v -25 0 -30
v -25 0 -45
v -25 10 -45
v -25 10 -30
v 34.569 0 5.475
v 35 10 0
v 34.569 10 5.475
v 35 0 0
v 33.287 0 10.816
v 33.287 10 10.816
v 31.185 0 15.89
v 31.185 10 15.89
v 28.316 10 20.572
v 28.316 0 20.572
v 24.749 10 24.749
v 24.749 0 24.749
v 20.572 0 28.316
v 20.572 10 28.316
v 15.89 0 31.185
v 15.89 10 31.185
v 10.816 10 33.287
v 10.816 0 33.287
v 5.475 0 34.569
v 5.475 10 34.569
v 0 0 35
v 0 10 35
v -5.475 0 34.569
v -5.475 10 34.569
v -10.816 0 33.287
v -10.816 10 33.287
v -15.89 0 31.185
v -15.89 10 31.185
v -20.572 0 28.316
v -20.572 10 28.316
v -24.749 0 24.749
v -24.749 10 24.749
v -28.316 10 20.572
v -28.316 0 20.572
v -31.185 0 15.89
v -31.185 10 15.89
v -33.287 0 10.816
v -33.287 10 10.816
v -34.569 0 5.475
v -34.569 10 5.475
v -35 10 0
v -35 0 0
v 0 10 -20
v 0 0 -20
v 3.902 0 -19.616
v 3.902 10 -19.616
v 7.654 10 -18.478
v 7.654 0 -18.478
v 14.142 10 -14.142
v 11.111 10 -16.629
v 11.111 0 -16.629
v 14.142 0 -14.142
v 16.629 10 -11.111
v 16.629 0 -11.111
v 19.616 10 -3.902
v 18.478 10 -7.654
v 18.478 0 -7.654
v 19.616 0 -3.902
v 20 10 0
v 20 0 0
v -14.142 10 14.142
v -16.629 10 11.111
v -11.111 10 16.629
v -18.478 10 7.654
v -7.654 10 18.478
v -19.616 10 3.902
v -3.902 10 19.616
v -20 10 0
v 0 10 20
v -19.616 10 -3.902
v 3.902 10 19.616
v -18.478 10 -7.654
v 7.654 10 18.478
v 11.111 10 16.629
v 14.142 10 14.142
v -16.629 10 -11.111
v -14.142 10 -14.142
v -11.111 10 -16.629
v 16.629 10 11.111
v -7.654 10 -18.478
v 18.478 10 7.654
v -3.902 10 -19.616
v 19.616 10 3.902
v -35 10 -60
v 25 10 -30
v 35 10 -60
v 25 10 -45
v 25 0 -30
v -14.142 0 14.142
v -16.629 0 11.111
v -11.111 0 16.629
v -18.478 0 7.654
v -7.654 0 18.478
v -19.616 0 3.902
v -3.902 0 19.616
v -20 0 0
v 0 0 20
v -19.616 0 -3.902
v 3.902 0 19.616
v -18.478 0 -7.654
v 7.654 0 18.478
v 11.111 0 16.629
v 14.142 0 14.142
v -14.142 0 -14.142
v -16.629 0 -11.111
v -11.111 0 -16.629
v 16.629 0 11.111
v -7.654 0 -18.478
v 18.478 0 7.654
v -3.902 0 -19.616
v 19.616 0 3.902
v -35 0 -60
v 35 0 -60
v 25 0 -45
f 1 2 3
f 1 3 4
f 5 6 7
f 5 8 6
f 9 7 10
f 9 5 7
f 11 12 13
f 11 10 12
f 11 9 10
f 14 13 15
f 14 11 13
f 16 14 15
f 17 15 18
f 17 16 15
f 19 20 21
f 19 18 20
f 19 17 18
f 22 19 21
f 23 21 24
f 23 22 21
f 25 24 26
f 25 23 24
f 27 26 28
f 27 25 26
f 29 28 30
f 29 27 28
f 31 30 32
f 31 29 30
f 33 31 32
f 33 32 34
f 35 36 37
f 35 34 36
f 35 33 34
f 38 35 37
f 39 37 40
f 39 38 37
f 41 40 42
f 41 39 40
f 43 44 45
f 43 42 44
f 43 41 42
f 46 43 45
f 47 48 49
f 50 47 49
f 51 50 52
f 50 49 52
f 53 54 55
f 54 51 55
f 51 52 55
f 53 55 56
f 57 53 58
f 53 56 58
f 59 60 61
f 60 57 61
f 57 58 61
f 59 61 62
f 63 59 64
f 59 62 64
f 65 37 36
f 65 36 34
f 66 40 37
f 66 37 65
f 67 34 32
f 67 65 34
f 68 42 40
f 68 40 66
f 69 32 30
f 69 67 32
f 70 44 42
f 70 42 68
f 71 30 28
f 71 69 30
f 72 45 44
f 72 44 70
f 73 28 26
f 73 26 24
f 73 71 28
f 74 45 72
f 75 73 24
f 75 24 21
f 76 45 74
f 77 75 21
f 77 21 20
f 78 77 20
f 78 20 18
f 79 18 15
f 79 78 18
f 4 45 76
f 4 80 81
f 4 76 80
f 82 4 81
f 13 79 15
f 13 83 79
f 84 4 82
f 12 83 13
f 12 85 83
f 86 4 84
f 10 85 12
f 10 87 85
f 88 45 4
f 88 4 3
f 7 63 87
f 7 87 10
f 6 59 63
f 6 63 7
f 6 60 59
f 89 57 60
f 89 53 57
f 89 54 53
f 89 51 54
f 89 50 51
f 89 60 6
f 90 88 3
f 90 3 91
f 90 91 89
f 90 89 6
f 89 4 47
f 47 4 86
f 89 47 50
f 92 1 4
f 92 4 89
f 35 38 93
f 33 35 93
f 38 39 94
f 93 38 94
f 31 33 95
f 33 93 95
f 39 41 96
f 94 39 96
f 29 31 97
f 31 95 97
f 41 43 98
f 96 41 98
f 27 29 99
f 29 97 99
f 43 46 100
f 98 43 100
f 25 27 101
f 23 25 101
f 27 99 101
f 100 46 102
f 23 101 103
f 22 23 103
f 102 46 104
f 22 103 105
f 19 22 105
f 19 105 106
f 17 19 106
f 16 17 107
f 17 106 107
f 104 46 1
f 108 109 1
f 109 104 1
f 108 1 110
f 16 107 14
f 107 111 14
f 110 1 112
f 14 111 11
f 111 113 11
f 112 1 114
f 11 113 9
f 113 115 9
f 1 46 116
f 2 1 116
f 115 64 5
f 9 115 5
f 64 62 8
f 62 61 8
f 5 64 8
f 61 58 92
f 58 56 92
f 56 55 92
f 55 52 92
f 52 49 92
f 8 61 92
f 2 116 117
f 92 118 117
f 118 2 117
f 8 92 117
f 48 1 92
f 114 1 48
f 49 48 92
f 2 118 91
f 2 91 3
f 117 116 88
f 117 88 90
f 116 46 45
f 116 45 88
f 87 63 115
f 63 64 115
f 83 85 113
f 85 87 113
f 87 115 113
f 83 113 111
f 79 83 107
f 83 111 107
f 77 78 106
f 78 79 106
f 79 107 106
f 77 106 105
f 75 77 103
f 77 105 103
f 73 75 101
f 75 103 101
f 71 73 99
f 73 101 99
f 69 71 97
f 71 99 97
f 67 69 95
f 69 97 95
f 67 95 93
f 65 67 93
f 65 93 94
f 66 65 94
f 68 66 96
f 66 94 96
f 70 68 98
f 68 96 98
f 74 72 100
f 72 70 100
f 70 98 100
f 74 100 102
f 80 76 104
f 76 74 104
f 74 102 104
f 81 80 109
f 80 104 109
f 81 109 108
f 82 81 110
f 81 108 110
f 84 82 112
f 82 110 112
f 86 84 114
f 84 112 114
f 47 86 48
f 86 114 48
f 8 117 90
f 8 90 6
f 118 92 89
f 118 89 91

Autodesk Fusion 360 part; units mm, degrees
sketch "Sketch1" plane through (0, 0, 0) normal (0, 1, 0) x (1, 0, 0) in component "Component'"
  circle A0 centre (0, 0) radius 20
  line L0 (0, 0) -> (0, 20)
  line L1 (-35, 0) -> (-35, 60)
  line L2 (-35, 60) -> (35, 60)
  line L3 (35, 60) -> (35, 0)
  arc A1 (-35, 0) -> (35, 0) centre (0, 0) ccw
  line L4 (0, 20) -> (0, 37.5) construction
  line L5 (25, 45) -> (-25, 45)
  line L6 (-25, 45) -> (-25, 30)
  line L7 (-25, 30) -> (25, 30)
  line L8 (25, 30) -> (25, 45)
  line L9 (25, 45) -> (-25, 30) construction
  line L10 (-25, 45) -> (25, 30) construction
  point P0 (0, 37.5)
  dimension "d1" = 40
  dimension "d2" = 70
  dimension "d4" = 70
  dimension "d5" = 17.5
  dimension "d6" = 50
  dimension "d7" = 15
sketch "Sketch2" plane through (0, 0, 0) normal (0, 1, 0) x (1, 0, 0) in component "Component'"
extrude "Extrude1" add sketch "Sketch1" along normal blind 10
component "Component" placed x (1, 0, 0) y (0, 1, 0) z (0, 0, 1) at (0, 0, 0)
component "Component'" placed x (1, 0, 0) y (0, 1, 0) z (0, 0, 1) at (0, 0, 0) in component "Component"
